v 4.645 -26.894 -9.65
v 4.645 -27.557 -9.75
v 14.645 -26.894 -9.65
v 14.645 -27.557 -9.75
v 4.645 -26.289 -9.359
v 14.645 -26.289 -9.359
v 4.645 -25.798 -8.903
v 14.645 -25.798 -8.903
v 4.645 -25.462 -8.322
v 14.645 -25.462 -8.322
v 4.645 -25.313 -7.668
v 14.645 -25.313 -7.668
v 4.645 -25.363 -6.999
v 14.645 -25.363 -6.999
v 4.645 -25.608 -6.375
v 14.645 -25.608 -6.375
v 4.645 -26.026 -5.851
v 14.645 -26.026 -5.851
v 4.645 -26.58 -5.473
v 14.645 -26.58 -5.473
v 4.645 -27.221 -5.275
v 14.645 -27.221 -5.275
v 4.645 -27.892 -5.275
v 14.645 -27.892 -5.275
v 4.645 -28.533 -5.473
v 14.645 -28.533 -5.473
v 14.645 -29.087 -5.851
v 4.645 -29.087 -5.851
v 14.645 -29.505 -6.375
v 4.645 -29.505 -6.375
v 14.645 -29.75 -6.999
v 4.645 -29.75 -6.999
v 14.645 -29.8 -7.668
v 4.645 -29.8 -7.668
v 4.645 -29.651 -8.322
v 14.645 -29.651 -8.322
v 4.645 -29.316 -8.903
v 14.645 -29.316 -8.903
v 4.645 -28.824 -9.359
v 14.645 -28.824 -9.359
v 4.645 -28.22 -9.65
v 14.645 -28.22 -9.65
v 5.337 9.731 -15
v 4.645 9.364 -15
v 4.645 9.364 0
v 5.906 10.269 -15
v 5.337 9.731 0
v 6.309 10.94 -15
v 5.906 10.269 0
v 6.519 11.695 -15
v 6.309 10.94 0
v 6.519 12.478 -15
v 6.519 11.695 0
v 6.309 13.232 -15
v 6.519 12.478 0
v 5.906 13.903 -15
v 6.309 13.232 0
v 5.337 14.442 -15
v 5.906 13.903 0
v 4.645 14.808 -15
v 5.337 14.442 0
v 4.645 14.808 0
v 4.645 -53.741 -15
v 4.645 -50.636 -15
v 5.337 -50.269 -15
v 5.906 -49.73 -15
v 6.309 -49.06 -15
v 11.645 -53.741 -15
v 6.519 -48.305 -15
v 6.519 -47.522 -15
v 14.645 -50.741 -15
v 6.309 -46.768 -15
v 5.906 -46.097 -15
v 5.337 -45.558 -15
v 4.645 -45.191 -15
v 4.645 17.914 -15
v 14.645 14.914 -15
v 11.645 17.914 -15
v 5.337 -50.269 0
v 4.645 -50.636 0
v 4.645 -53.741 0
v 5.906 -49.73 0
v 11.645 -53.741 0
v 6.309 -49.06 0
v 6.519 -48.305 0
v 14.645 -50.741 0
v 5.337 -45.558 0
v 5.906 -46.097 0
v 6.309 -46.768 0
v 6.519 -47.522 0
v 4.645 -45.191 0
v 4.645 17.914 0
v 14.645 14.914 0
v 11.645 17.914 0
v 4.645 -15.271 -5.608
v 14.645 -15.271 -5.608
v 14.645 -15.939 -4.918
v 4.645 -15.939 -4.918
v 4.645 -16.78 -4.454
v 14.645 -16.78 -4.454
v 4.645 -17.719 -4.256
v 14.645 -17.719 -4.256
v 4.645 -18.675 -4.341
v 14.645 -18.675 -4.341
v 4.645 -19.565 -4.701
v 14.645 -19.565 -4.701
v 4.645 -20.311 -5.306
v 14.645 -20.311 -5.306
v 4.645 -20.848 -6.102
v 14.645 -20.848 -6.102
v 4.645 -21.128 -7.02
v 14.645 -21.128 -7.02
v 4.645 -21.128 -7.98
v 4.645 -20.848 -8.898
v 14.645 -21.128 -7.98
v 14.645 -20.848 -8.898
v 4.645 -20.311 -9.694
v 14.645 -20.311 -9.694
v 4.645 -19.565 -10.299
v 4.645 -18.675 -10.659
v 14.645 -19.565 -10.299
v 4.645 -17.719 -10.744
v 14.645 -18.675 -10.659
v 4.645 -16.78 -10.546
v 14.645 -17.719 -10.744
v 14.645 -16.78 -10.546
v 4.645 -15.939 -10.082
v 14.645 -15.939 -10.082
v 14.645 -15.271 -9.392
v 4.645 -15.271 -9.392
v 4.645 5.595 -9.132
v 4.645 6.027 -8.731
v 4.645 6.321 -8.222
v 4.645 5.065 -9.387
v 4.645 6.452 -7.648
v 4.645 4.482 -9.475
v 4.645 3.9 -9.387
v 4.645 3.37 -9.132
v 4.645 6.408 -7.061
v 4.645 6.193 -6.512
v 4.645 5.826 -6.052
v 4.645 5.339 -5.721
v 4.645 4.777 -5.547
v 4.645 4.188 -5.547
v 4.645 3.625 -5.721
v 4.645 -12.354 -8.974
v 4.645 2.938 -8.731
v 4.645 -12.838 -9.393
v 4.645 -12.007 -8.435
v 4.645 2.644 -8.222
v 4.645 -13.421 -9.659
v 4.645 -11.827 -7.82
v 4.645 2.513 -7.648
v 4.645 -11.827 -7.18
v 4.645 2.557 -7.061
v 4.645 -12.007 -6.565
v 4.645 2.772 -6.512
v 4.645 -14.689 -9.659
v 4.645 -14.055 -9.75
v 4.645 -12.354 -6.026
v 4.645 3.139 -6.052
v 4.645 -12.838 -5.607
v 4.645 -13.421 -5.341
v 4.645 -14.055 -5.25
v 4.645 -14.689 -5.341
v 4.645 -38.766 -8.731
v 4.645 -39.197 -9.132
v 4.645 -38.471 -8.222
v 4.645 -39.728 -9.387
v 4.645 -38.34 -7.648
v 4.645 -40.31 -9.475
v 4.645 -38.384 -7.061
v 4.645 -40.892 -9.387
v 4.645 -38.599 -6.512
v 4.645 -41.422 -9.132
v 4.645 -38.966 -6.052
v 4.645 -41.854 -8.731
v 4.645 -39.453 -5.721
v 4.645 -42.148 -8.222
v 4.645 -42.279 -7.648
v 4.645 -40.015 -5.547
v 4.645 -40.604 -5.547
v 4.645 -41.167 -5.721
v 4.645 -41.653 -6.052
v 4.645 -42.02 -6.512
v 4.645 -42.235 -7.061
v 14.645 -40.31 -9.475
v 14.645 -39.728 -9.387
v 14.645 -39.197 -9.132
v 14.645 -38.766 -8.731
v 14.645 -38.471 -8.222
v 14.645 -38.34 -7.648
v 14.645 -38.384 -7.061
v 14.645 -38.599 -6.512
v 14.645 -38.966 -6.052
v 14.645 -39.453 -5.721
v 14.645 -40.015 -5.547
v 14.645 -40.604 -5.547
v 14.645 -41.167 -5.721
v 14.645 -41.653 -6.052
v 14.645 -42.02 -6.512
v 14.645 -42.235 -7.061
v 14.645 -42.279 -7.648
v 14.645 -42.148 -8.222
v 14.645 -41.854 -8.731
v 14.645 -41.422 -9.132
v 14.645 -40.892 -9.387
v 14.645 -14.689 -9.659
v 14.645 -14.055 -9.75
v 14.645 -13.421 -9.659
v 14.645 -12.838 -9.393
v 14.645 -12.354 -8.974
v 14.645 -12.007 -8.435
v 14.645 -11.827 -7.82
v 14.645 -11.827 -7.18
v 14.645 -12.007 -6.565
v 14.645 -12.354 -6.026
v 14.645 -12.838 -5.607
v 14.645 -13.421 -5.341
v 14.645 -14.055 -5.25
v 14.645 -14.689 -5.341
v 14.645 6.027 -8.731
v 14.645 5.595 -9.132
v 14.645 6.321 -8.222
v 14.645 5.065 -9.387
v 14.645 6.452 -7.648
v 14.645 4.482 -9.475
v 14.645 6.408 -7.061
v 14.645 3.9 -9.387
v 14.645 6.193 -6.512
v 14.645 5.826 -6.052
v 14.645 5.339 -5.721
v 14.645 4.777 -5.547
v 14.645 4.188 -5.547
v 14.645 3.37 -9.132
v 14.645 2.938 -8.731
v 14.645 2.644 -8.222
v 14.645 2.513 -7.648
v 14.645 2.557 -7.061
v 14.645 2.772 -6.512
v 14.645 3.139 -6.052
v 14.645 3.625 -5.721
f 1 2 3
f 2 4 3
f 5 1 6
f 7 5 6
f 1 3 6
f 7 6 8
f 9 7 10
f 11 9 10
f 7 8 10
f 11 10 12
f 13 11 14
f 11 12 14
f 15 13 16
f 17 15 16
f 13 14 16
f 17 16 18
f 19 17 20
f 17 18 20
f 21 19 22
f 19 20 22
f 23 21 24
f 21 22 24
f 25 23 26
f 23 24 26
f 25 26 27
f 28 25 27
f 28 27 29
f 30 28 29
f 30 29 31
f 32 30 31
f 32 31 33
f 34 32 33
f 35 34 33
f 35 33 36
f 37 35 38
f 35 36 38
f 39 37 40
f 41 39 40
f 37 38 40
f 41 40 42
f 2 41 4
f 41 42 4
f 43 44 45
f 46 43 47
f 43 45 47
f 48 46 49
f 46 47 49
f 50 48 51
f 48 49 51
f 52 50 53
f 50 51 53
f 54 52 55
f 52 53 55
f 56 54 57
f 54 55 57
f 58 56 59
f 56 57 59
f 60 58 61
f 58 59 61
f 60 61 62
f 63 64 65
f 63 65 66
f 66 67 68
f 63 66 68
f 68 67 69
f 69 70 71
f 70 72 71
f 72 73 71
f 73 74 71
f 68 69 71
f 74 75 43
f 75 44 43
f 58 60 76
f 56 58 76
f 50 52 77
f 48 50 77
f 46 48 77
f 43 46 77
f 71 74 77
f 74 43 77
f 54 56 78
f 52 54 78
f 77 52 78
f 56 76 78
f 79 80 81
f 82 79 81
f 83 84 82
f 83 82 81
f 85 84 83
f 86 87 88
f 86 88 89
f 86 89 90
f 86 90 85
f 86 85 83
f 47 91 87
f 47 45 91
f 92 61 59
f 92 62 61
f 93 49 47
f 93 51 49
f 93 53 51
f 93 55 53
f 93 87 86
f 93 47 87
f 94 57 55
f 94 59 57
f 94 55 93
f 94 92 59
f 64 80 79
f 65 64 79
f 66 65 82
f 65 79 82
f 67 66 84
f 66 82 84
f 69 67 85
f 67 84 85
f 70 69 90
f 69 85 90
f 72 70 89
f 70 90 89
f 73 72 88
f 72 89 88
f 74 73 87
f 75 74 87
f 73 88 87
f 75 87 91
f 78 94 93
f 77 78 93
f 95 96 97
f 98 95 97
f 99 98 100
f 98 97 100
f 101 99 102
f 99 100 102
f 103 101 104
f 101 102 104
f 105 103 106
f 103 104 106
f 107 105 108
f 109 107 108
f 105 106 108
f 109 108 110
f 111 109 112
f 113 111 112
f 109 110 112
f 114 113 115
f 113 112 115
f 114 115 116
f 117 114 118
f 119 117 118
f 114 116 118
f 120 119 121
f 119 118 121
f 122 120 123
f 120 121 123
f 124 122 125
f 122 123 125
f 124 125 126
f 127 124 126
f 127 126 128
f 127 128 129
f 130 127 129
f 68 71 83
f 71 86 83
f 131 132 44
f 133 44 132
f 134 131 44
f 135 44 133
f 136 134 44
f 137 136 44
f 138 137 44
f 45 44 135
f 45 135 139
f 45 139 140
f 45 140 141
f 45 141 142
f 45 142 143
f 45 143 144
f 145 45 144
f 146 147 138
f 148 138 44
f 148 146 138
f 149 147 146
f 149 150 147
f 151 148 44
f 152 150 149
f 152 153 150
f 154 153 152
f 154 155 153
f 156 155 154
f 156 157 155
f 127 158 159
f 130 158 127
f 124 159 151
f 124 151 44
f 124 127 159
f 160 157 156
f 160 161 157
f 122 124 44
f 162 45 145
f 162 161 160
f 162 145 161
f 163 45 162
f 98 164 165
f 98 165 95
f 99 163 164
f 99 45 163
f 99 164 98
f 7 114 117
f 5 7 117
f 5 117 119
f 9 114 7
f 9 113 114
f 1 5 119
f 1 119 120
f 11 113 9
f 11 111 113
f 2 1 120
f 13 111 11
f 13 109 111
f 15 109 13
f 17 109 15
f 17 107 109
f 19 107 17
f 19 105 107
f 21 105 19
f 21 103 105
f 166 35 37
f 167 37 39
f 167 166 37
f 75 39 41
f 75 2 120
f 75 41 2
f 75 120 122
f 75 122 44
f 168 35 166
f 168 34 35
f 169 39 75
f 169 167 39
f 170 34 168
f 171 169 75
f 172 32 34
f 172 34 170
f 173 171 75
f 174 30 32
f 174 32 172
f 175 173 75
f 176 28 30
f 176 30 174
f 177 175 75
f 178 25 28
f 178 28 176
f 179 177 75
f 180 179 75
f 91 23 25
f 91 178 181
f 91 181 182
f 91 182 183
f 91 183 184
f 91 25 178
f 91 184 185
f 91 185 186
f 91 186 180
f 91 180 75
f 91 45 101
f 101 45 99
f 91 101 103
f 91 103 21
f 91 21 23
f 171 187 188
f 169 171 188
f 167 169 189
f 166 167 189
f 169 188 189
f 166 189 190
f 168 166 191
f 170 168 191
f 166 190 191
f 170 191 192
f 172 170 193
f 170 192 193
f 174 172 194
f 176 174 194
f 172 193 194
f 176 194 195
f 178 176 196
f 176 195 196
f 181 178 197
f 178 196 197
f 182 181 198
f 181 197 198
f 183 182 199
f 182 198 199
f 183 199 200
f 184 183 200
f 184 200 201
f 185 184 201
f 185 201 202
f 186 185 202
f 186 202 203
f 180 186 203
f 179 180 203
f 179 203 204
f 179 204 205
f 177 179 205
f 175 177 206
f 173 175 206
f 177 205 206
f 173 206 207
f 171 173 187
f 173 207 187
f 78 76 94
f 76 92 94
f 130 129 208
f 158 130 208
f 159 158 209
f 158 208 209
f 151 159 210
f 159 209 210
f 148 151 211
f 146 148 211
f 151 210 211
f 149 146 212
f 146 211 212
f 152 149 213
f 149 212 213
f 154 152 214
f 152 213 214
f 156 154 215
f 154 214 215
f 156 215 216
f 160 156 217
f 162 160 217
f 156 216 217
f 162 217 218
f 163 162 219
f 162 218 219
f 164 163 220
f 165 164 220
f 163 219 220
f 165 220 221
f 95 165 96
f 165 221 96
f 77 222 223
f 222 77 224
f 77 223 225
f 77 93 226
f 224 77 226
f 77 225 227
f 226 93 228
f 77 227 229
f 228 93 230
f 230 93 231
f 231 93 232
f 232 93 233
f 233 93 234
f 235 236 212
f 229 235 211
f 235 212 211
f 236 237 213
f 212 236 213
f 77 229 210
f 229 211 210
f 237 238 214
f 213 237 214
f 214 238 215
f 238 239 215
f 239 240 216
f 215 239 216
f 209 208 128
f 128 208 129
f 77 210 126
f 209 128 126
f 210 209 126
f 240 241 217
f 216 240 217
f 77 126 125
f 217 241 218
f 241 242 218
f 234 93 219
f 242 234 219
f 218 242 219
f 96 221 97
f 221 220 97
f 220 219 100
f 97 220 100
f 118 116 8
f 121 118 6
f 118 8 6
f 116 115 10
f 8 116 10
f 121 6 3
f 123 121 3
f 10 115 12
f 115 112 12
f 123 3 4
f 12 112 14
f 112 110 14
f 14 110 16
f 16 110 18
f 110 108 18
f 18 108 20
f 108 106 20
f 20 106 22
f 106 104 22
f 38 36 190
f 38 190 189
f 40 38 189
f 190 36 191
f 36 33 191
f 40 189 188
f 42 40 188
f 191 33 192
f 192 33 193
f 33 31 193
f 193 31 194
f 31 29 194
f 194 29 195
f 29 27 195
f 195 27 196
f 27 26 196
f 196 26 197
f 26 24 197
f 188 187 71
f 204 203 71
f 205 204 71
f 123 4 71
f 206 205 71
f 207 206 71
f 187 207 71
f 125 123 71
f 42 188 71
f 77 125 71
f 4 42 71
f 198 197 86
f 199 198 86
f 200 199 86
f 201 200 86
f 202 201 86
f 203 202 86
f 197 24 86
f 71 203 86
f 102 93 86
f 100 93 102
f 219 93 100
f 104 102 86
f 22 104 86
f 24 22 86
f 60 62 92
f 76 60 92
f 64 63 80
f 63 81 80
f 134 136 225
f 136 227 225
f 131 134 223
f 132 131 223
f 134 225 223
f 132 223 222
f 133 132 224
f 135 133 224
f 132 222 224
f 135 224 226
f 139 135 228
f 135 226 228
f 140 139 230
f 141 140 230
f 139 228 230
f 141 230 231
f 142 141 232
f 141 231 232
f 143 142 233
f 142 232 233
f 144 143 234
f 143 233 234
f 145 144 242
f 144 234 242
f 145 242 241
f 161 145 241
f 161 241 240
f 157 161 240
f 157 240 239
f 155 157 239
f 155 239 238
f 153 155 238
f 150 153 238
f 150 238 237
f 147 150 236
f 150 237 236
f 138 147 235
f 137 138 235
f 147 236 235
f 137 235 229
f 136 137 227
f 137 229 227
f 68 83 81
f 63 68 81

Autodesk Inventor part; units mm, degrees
ref_plane "YZ Plane" through (0, 0, 0) normal (1, 0, 0) x (0, 1, 0)
ref_plane "XZ Plane" through (0, 0, 0) normal (0, 1, 0) x (-1, 0, 0)
sketch "Szkic1" plane through (0, 0, 0) normal (0, 0, 1) x (1, 0, 0)
  arc A0 (3, 14.9136) -> (3, 9.2591) centre (3.6454, 12.0864) ccw projected
  circle A1 centre (3.6454, 12.0864) radius 2.9
  line L0 (4.6454, 14.8085) -> (4.6454, 17.9136)
  line L1 (3, 17.9136) -> (0, 17.9136) projected
  line L2 (4.6454, 17.9136) -> (11.6454, 17.9136)
  line L3 (14.6454, 14.9136) -> (14.6454, -17.9136)
  line L4 (-2.916, -17.9136) -> (18.8782, -17.9136) construction
  line L5 (4.6454, 9.3642) -> (4.6454, -17.9136)
  line L6 (4.6454, -17.9136) -> (14.6454, -17.9136)
  line L7 (11.6454, 17.9136) -> (14.6454, 14.9136)
  point P0 (0, 0)
  dimension "d0" = 45
  dimension "d1" = 3
  dimension "d8" = 30
  dimension "d9" = 1
  dimension "d10" = 5.8
  dimension "d11" = 11
ref_plane "Płaszczyzna konstrukcyjna1" through (-3, -53.7409, -15) normal (0, 0, -1) x (0, 1, 0)
extrude "Wyciągnięcie proste1" add sketch "Szkic1" against normal up to surface (15 mm away) contours L0 L2 L7 L3 L6 L5 A1
mirror "Odbij1" about plane through (14.6454, -17.9136, 0) normal (0, -1, 0) of "Wyciągnięcie proste1"
sketch "Szkic2" plane through (14.6454, 14.9136, 0) normal (1, 0, 0) x (0, 0, -1)
  circle A0 centre (7.5, -10.4312) radius 2.1 construction
  circle A1 centre (7.5, -32.8273) radius 3.25 construction
  circle A2 centre (7.5, -55.2233) radius 2.1 construction
  circle A3 centre (7.5, -10.4312) radius 1.975
  circle A4 centre (7.5, -55.2233) radius 1.975
  circle A5 centre (7.5, -32.8273) radius 3.25
  circle A6 centre (7.5, -28.9673) radius 2.25
  circle A7 centre (7.5, -42.4703) radius 2.25
  line L0 (7.5, -28.9673) -> (7.5, -36.6873) construction
  line L1 (15, 0) -> (15, -65.6545) construction
  point P0 (0, -14.9136)
  dimension "d5" = 3.95
  dimension "d12" = 4.5
  dimension "d13" = 4.5
  dimension "d14" = 13.503
  dimension "d15" = 9.643
extrude "Wyciągnięcie proste2" cut sketch "Szkic2" against normal through all
properties part number "6xMounting_base"
